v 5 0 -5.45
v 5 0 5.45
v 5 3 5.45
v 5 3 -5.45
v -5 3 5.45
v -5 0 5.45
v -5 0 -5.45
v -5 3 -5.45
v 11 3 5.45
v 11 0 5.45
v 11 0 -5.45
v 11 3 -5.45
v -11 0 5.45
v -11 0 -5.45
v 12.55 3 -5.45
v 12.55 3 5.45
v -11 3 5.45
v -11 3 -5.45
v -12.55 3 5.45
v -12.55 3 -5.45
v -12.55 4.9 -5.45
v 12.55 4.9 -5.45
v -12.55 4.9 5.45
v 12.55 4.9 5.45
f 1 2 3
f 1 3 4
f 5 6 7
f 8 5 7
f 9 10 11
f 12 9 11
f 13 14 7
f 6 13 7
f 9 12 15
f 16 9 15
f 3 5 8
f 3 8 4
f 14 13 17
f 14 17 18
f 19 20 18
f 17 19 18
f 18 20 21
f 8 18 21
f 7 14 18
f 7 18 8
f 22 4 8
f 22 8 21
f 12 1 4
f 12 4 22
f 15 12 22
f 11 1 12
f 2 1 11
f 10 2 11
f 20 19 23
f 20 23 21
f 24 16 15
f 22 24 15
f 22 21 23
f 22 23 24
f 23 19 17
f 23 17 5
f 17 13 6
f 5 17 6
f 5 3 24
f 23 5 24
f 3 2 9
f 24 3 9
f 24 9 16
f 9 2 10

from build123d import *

# Parameters (mm, degrees)
SKETCH1_W             = 6
SKETCH1_H             = 10.9
BOSS_EXTRUDE1_DEPTH   = 3
BOSS_EXTRUDE1_2_DEPTH = 3
SKETCH2_W             = 25.1
SKETCH2_H             = 10.9
BOSS_EXTRUDE2_DEPTH   = 1.9


with BuildPart() as part:
    # Sketch1 → Boss-Extrude1 (new body)
    with BuildSketch(Plane(origin=(0, 0, 0), x_dir=(1, 0, 0), z_dir=(0, 1, 0))):
        with Locations((-8, 0)):
            Rectangle(SKETCH1_W, SKETCH1_H)
    extrude(amount=BOSS_EXTRUDE1_DEPTH)



with BuildPart() as body_2:
    # Sketch1 → Boss-Extrude1 2 (new body)
    with BuildSketch(Plane(origin=(0, 0, 0), x_dir=(1, 0, 0), z_dir=(0, 1, 0))):
        with Locations((8, 0)):
            Rectangle(SKETCH1_W, SKETCH1_H)
    extrude(amount=BOSS_EXTRUDE1_2_DEPTH)


with BuildPart() as part_1:
    add(part.part)

    add(body_2.part)  # Boss-Extrude2 merges body 2
    # Sketch2 → Boss-Extrude2 (add)
    with BuildSketch(Plane(origin=(0, 3, 0), x_dir=(1, 0, 0), z_dir=(0, 1, 0))):
        Rectangle(SKETCH2_W, SKETCH2_H)
    extrude(amount=BOSS_EXTRUDE2_DEPTH)


solid = part_1.part
